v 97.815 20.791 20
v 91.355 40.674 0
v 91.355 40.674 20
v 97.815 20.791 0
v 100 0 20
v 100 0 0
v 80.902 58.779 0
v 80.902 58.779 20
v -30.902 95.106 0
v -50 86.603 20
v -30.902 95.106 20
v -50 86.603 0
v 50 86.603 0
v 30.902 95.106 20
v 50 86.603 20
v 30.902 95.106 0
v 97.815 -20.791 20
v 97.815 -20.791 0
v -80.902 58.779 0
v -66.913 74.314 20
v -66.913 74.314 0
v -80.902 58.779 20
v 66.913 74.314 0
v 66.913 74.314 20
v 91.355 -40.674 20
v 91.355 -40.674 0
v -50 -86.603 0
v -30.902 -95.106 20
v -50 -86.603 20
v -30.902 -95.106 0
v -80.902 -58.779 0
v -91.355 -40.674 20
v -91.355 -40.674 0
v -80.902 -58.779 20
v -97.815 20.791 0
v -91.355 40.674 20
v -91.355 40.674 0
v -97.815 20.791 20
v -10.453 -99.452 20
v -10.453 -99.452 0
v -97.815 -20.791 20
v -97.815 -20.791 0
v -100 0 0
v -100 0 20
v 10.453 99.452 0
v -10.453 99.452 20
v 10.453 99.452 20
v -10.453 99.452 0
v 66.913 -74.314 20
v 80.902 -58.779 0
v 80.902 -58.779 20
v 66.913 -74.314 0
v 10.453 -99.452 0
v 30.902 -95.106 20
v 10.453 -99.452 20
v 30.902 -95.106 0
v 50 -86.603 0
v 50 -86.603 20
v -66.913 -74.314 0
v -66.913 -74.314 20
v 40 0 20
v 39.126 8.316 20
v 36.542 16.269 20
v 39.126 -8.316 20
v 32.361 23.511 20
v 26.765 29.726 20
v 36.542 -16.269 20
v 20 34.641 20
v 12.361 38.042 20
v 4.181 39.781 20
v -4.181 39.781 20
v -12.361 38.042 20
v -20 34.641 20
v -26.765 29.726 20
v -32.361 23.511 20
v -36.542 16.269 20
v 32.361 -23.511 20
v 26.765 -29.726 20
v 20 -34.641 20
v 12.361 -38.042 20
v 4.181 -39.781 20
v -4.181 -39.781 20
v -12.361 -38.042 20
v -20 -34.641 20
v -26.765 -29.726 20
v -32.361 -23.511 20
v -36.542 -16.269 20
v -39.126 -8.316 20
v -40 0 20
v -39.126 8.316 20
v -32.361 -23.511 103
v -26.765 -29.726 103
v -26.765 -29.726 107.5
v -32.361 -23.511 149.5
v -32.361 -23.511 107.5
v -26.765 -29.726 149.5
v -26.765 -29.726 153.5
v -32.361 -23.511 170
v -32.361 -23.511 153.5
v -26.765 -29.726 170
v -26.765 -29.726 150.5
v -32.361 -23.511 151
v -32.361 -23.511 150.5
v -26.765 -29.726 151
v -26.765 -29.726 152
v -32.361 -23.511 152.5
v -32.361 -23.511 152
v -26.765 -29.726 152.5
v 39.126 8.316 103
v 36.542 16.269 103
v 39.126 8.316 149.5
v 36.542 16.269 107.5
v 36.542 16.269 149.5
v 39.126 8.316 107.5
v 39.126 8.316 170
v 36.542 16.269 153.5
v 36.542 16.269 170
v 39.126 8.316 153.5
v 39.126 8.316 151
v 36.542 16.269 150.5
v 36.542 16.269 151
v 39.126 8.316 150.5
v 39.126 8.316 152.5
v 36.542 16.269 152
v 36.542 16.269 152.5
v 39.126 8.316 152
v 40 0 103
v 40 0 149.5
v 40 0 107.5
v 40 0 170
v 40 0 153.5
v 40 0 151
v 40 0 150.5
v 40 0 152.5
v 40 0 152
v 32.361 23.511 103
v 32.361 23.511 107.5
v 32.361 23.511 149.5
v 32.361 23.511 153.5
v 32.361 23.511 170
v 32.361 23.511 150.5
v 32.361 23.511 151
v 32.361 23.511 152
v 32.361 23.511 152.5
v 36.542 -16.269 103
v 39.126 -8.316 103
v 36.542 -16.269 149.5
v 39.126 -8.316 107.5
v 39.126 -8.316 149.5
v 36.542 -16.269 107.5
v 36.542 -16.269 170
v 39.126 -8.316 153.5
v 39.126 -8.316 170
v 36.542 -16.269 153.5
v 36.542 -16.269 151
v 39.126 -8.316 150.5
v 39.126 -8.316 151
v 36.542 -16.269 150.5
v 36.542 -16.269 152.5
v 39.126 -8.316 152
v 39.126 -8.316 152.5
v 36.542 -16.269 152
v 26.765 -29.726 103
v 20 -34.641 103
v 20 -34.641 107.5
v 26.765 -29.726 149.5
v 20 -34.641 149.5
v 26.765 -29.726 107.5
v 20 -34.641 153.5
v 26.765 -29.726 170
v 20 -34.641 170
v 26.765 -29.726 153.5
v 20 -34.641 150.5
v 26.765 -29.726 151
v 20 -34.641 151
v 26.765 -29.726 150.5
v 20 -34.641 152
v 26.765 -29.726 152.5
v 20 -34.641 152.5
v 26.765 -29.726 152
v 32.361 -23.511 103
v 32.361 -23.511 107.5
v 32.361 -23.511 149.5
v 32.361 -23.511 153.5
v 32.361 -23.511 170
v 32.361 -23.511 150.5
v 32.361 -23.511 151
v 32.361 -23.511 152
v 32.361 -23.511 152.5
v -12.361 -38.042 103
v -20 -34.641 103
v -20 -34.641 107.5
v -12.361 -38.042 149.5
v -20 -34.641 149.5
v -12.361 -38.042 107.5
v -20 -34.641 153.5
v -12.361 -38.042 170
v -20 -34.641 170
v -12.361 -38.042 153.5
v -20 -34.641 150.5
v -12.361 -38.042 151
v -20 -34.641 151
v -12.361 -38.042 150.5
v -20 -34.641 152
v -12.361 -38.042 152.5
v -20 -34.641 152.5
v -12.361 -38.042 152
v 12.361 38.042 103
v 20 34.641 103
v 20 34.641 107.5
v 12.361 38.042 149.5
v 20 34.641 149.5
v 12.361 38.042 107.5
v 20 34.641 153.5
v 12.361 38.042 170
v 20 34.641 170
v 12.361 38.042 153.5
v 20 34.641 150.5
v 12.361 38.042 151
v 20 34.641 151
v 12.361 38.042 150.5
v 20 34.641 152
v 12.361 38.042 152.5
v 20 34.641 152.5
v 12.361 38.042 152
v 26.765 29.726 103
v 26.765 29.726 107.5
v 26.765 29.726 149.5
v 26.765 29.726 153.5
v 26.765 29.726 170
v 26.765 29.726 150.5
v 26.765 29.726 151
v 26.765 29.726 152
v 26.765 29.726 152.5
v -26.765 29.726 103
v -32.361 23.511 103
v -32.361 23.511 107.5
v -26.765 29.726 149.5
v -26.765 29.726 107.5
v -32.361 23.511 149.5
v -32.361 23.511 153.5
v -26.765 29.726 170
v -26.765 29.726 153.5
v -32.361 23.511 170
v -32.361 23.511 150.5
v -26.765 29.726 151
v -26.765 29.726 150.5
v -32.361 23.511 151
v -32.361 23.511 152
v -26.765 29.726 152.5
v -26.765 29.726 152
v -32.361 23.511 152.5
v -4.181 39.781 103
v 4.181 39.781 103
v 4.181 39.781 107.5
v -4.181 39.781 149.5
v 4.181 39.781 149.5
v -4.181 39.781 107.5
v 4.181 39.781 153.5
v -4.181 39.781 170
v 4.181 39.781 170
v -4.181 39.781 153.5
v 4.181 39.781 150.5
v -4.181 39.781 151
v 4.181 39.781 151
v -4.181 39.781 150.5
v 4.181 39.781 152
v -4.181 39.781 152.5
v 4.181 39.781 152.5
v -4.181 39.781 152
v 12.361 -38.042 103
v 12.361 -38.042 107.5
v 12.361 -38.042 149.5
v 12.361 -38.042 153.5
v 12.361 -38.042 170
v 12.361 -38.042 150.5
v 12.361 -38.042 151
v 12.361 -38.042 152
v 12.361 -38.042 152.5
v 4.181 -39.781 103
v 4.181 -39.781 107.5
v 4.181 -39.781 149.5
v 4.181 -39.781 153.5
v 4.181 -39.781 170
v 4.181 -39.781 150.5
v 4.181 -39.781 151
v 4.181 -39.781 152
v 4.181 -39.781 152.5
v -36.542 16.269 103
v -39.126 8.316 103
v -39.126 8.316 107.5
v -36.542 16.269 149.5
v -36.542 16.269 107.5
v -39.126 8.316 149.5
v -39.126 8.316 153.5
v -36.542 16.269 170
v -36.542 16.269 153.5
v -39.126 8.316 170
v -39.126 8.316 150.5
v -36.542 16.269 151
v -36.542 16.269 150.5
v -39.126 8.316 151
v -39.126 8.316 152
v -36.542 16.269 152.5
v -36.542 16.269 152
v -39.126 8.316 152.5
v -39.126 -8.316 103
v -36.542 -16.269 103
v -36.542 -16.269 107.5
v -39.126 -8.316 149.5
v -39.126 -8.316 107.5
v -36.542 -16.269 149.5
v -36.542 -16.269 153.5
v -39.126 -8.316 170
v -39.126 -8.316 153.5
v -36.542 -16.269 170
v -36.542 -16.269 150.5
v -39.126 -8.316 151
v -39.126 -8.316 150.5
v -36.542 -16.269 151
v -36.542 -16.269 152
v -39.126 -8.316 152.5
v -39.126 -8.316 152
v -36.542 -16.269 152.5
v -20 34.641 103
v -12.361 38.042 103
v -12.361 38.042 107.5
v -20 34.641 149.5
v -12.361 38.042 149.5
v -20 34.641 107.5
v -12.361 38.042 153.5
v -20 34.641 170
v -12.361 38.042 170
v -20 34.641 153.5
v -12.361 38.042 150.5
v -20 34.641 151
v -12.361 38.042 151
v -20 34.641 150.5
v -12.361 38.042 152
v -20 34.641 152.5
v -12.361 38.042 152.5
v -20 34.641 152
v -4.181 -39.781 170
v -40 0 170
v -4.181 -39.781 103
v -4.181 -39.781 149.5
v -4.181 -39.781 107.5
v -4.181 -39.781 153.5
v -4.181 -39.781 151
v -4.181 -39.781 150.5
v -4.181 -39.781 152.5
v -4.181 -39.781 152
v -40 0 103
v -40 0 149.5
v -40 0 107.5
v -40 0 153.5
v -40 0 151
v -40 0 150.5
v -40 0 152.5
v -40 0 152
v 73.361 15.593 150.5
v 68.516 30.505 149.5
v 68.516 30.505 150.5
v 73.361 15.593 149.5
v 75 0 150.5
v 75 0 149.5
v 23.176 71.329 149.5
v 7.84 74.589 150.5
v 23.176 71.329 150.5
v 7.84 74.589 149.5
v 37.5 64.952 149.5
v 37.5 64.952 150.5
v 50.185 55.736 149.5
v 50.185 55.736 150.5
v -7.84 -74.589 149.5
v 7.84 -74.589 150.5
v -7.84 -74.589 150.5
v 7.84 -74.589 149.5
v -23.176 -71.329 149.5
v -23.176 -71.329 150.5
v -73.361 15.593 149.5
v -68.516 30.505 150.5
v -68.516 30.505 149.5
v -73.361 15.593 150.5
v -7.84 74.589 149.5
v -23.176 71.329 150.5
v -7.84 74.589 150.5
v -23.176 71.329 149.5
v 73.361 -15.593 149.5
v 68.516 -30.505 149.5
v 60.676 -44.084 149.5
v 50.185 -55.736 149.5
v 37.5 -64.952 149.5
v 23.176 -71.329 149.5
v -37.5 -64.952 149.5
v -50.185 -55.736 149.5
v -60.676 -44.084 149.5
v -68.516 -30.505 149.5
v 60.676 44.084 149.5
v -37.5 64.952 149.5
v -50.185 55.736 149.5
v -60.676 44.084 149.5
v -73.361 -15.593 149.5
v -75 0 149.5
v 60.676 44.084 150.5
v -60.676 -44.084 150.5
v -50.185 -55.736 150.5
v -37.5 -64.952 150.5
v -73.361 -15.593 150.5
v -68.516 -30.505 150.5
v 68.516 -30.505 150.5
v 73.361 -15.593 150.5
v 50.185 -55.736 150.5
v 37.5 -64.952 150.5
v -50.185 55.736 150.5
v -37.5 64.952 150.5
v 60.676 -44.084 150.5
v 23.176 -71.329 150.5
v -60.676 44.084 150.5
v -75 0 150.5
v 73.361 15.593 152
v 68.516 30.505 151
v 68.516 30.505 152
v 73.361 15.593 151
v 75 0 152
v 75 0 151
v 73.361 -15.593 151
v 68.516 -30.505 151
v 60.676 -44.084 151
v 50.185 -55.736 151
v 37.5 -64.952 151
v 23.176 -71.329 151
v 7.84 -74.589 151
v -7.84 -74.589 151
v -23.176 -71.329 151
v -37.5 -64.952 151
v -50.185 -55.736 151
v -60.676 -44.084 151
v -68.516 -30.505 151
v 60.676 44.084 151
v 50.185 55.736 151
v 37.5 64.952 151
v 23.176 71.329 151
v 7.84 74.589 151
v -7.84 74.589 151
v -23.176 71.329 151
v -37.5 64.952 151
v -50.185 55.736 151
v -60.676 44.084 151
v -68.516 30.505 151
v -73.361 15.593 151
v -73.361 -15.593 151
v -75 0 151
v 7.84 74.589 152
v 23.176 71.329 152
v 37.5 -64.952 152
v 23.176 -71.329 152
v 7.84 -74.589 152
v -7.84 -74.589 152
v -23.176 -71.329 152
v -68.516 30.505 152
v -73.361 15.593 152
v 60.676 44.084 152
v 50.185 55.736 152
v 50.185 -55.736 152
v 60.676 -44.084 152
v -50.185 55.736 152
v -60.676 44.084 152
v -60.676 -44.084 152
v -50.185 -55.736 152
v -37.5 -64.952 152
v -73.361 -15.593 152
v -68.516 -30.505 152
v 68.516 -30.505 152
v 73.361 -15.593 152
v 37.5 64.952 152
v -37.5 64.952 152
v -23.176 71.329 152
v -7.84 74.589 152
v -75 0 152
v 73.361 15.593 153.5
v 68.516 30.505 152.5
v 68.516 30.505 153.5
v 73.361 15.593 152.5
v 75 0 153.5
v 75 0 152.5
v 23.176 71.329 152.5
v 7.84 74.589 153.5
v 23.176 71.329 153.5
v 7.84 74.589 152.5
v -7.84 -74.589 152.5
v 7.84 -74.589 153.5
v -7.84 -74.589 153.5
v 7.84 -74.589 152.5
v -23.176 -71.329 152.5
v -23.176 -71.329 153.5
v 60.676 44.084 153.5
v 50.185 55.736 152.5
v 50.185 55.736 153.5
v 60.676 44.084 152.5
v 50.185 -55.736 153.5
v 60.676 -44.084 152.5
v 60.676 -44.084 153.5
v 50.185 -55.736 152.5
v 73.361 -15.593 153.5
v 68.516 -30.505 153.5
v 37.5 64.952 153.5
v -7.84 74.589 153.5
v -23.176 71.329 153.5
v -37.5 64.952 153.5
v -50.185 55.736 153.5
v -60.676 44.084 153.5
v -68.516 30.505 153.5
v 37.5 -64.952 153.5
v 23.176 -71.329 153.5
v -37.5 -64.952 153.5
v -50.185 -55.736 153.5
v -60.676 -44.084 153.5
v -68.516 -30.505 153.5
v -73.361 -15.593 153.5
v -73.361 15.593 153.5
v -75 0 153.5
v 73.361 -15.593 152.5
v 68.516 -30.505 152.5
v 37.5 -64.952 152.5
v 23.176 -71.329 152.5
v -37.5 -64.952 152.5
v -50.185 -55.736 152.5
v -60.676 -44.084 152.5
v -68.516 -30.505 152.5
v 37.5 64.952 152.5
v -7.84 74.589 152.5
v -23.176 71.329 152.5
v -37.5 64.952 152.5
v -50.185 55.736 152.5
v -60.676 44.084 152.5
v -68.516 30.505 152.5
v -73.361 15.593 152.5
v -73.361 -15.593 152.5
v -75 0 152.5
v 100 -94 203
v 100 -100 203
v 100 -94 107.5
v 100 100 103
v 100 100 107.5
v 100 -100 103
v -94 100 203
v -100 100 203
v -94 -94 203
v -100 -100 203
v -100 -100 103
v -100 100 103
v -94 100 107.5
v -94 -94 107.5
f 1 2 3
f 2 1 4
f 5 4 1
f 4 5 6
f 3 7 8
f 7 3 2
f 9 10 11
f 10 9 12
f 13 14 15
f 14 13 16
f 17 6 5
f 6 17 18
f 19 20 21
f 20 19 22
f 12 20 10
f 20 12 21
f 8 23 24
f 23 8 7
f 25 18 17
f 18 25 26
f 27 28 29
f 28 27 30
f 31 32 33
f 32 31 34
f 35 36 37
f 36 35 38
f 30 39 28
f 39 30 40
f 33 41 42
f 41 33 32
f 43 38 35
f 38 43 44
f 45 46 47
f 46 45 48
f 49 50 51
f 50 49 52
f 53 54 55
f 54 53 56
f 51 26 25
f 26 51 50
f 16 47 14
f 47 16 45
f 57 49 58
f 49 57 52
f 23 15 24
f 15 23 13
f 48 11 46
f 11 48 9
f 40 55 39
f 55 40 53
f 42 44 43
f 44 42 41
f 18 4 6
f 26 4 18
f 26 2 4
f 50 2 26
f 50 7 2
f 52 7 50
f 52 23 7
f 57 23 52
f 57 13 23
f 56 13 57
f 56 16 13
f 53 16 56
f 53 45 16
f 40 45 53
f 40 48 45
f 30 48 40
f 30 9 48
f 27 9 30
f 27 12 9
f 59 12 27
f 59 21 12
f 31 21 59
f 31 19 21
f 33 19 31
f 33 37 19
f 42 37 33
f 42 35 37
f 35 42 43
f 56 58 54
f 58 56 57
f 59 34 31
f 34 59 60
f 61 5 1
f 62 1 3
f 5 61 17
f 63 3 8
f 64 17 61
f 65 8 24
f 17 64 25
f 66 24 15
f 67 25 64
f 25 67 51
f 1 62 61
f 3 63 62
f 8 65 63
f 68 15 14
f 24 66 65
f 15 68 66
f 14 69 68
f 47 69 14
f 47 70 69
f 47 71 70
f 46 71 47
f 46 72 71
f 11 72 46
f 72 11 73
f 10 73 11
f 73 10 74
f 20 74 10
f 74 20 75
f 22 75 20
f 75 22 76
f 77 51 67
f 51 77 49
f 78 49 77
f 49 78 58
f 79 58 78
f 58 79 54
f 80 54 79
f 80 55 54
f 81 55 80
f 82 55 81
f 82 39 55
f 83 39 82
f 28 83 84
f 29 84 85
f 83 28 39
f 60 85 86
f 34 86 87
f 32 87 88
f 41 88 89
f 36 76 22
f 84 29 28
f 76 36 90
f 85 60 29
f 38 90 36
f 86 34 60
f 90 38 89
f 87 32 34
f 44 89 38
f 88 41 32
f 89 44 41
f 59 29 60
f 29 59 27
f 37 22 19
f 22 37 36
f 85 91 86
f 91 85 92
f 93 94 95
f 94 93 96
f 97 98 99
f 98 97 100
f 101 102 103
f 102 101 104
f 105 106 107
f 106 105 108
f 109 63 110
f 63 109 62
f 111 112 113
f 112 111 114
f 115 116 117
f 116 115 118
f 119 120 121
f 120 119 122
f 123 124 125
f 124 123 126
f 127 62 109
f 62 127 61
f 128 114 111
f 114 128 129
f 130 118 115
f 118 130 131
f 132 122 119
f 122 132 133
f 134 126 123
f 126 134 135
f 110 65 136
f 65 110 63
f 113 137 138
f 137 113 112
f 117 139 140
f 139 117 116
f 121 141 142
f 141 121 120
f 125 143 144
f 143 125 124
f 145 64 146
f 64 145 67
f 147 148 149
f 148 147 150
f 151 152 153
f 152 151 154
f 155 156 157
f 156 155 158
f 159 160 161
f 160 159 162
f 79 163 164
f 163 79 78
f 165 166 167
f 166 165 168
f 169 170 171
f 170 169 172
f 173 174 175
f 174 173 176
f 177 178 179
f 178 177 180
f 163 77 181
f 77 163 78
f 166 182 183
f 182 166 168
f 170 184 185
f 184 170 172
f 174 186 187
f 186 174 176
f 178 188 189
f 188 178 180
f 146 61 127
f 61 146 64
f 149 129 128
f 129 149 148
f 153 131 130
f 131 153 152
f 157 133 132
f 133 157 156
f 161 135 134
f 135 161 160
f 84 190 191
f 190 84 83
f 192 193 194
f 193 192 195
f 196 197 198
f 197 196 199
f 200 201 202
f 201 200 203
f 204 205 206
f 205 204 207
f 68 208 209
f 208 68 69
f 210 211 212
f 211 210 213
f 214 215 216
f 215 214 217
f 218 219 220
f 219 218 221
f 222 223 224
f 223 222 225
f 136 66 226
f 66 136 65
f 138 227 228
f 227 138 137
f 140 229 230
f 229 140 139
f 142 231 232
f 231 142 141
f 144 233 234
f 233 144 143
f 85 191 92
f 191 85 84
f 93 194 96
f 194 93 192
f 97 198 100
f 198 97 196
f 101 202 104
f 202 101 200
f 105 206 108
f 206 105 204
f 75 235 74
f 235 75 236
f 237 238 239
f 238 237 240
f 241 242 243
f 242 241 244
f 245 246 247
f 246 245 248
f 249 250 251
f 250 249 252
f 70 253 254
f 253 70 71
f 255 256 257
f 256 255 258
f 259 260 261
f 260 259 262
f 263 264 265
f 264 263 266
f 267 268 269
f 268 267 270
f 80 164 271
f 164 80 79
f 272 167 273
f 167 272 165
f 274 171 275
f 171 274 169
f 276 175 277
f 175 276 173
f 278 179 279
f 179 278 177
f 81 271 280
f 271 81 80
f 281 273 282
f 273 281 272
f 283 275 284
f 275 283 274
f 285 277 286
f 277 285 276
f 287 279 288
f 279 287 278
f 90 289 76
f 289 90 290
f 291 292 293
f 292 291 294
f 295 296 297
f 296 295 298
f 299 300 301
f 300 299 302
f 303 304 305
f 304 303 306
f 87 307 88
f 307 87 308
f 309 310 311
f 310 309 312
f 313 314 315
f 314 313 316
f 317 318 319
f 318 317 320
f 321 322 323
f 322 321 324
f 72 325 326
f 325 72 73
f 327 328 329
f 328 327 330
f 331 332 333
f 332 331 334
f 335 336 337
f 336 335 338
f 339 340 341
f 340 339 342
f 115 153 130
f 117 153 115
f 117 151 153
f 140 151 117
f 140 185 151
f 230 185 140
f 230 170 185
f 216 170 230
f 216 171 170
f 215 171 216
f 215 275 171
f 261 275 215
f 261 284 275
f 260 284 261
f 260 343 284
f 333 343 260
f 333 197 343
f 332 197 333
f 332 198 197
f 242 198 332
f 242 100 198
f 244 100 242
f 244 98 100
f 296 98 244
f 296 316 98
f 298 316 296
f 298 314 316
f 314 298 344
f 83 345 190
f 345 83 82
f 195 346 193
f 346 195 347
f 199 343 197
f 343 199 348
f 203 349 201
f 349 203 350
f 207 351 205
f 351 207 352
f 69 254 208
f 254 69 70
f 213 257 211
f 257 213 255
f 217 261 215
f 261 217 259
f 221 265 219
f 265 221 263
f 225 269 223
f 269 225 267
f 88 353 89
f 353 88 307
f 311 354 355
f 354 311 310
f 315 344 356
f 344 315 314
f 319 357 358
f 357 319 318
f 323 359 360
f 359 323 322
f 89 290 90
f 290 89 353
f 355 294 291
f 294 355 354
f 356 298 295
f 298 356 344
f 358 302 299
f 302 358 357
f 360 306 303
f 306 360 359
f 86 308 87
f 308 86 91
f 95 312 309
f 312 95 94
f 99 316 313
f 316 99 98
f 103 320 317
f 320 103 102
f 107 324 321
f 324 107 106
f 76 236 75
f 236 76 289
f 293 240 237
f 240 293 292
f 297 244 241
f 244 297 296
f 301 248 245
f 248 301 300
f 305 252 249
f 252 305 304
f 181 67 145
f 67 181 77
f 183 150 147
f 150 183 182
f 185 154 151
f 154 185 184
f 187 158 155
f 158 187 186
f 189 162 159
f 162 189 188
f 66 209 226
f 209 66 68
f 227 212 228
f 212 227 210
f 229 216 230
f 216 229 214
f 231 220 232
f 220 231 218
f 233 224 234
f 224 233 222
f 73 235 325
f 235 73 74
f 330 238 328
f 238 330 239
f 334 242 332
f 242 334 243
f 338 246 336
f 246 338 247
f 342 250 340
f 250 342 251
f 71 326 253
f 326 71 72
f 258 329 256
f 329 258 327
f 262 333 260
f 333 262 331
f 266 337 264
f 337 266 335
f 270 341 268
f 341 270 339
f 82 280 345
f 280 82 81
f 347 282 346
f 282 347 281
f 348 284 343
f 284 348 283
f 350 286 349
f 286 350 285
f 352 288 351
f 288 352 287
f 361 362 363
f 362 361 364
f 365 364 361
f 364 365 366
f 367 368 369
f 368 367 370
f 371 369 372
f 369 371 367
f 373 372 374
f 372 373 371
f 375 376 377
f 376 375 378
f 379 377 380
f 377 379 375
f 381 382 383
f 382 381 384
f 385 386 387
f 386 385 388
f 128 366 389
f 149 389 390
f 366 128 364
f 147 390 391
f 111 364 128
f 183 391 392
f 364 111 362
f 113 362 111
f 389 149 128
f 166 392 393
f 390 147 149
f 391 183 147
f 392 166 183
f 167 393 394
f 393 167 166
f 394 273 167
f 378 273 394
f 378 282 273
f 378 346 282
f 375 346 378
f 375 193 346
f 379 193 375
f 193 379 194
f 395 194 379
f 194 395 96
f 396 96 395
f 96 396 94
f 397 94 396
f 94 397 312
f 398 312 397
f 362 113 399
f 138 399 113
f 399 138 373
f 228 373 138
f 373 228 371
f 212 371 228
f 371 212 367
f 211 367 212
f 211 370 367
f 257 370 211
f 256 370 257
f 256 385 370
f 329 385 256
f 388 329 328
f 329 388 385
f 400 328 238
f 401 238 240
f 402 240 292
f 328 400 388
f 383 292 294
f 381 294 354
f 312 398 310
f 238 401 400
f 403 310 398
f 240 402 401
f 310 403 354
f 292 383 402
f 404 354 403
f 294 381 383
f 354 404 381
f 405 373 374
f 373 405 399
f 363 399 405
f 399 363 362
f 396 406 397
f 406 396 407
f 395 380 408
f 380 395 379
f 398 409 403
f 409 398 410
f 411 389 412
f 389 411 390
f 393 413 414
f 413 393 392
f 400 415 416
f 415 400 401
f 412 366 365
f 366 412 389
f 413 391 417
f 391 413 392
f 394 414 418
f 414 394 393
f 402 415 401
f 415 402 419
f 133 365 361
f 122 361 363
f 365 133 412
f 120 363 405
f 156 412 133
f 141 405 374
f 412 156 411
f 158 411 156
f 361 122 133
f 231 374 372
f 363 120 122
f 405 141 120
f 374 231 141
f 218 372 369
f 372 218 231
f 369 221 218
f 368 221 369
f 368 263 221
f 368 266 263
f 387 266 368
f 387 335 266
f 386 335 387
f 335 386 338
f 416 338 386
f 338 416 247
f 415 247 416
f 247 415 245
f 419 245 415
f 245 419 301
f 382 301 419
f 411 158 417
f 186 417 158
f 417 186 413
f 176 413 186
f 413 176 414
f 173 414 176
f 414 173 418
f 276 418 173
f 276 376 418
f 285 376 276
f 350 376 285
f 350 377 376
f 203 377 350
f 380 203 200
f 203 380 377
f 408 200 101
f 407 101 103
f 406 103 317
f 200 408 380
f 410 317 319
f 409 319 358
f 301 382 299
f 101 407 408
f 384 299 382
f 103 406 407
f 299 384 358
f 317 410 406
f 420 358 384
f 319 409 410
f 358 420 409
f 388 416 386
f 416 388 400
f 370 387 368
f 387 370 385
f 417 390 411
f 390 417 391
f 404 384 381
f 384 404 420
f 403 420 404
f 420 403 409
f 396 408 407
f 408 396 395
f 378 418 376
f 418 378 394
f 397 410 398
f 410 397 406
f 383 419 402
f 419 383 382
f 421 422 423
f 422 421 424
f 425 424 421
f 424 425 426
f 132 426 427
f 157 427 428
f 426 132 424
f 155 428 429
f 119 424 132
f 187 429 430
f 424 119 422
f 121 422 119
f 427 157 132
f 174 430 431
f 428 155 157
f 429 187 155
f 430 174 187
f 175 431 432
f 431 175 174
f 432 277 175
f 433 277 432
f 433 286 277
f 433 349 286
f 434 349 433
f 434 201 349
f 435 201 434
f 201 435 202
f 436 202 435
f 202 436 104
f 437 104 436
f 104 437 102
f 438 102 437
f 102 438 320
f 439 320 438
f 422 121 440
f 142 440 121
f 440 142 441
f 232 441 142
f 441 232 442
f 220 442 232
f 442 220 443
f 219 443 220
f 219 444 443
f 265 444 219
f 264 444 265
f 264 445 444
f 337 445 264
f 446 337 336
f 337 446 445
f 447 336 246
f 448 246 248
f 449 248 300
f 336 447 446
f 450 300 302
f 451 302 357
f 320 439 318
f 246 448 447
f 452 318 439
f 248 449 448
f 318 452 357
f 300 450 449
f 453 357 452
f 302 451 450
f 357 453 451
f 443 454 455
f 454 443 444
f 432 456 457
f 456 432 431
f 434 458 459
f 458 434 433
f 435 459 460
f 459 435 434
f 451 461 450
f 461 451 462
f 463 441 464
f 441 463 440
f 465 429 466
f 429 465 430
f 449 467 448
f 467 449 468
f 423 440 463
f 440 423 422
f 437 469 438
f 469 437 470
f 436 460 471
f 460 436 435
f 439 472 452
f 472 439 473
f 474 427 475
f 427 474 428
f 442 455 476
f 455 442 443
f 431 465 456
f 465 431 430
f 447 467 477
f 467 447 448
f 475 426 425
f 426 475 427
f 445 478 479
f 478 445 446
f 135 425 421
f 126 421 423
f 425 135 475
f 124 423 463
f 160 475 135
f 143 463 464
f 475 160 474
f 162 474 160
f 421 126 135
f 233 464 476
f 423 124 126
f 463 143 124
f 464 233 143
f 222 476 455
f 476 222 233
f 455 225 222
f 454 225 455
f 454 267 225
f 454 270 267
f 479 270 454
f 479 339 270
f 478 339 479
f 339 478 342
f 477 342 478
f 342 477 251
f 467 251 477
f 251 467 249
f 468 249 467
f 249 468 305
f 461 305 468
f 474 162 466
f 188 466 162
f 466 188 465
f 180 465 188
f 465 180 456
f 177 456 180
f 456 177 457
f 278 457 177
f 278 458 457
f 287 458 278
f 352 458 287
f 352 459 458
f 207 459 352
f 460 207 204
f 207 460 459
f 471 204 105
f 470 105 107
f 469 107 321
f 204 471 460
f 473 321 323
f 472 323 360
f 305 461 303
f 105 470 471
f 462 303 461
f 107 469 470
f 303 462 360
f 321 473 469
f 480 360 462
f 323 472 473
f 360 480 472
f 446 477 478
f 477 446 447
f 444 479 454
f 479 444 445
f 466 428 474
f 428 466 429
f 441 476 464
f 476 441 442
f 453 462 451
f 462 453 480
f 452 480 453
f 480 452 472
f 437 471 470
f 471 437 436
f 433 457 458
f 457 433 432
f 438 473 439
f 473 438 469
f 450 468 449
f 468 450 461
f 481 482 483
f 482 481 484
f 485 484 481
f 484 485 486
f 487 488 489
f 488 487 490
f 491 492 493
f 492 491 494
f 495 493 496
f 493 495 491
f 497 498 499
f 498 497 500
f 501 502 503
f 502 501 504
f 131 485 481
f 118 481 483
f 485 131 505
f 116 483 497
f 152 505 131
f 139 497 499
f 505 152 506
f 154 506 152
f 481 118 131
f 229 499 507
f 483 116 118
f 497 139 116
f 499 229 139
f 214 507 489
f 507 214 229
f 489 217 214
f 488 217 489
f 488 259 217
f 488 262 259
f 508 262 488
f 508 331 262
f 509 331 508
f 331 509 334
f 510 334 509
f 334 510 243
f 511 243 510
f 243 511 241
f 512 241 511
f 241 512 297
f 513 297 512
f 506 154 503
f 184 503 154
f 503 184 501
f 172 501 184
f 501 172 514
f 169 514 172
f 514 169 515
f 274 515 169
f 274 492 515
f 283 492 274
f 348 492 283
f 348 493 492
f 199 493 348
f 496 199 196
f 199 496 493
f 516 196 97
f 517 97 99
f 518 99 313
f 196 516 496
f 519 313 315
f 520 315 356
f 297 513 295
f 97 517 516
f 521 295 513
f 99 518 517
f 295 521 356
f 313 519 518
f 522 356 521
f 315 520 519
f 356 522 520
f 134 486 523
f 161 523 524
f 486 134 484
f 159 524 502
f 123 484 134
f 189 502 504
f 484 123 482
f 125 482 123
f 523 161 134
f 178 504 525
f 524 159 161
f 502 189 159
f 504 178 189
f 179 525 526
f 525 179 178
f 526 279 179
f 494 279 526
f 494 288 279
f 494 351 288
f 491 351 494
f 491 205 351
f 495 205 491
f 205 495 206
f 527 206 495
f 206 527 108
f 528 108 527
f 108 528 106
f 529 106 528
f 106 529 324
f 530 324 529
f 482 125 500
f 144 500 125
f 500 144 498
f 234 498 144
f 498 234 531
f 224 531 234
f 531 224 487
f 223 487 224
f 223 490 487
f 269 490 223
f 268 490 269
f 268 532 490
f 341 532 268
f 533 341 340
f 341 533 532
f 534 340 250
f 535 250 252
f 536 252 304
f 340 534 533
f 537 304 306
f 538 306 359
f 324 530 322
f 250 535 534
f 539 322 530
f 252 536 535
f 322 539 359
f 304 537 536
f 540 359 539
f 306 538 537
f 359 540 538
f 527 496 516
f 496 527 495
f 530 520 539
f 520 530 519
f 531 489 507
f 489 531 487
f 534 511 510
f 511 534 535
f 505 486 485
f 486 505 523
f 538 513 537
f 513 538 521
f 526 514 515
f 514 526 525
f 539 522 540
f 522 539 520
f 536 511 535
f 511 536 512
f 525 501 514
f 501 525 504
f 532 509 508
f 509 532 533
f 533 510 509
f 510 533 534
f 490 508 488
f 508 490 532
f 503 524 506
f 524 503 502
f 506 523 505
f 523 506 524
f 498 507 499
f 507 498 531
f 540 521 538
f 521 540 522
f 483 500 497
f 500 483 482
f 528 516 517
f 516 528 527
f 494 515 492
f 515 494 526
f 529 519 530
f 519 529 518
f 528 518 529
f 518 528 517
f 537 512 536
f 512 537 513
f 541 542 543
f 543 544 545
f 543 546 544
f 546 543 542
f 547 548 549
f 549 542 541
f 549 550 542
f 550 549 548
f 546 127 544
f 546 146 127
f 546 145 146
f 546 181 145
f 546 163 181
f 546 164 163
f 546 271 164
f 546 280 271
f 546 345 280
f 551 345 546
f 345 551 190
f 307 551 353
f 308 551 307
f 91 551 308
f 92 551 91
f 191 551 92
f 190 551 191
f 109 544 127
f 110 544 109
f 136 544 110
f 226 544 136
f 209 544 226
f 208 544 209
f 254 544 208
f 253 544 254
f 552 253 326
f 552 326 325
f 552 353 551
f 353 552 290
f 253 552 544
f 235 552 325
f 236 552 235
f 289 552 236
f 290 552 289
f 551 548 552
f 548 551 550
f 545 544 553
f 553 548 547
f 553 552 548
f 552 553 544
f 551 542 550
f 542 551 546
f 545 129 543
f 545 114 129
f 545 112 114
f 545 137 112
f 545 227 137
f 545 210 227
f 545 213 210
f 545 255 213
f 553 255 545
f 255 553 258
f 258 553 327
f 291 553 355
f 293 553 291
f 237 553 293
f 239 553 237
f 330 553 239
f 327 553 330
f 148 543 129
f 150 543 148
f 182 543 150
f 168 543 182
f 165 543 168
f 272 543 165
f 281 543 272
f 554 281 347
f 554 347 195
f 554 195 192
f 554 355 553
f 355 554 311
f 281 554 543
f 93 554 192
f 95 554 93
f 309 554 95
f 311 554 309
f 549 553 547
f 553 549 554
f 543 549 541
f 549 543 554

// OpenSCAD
// Parameters for Kelly Kettle simulacrum
kettle_base_diameter = 200;     // Diameter of the Kelly Kettle base (mm)
kettle_flue_diameter = 80;      // Diameter of the flue (mm)
kettle_flue_height = 150;       // Height of the flue (mm)

// Parameters for AirBox
air_box_width = 200;            // Width of the Air Box (mm)
air_box_height = 100;           // Height of the Air Box (mm)
wall_thickness = 3;             // Thickness of Air Box walls (mm)

// Parameters for Airflow Regulator
base_diameter = 150;            // Diameter of the regulator plates (mm)
plate_thickness = 1;            // Thickness of each regulator plate (mm)
air_channel_width = 20;         // Width of airflow channels (mm)
num_air_channels = 6;           // Number of airflow channels
rotation_limit = 45;            // Maximum rotation of regulator plates (degrees)

// Main function: Integration of all components
module integrated_model() {
    // Visualize the Kelly Kettle
    kelly_kettle();

    // Add the airflow regulator
    translate([0, 0, kettle_flue_height])
    air_regulator_system();

    // Add the Air Box
    translate([0, 0, kettle_flue_height + 2 * (plate_thickness + 0.5)])
    air_box_attachment();
}

// Simulacrum of the Kelly Kettle
module kelly_kettle() {
    // Base
    cylinder(r=kettle_base_diameter / 2, h=20, center=false);

    // Flue
    translate([0, 0, 20])
    cylinder(r=kettle_flue_diameter / 2, h=kettle_flue_height, center=false);
}

// Airflow regulator system (reused from previous design)
module air_regulator_system() {
    translate([0, 0, 0])
    base_plate();
    
    translate([0, 0, plate_thickness + 0.5])
    middle_plate();
    
    translate([0, 0, 2 * (plate_thickness + 0.5)])
    top_plate();
}

// Base Plate
module base_plate() {
    difference() {
        cylinder(r=base_diameter / 2, h=plate_thickness, center=true);
        for (i = [0 : 360 / num_air_channels : 360 - 360 / num_air_channels]) {
            rotate([0, 0, i])
            translate([base_diameter / 4, 0, 0])
            square_air_channel();
        }
    }
}

// Middle Plate
module middle_plate() {
    difference() {
        cylinder(r=base_diameter / 2, h=plate_thickness, center=true);
        for (i = [0 : 360 / num_air_channels : 360 - 360 / num_air_channels]) {
            rotate([0, 0, i])
            translate([base_diameter / 4, 0, 0])
            square_air_channel(size_factor=0.8);
        }
    }
}

// Top Plate
module top_plate() {
    difference() {
        cylinder(r=base_diameter / 2, h=plate_thickness, center=true);
        for (i = [0 : 360 / num_air_channels : 360 - 360 / num_air_channels]) {
            rotate([0, 0, i + rotation_limit / 2])
            translate([base_diameter / 4, 0, 0])
            square_air_channel(size_factor=0.6);
        }
    }
}

// Square air channel for regulator plates
module square_air_channel(size_factor=1) {
    square([air_channel_width * size_factor, air_channel_width * size_factor], center=true);
}

// AirBox (reused from previous design)
module air_box_attachment() {
    difference() {
        translate([0, 0, 0])
        cube([air_box_width, air_box_width, air_box_height], true);

        translate([wall_thickness, wall_thickness, wall_thickness])
        cube([air_box_width - 2 * wall_thickness, air_box_width - 2 * wall_thickness, air_box_height - wall_thickness], true);

        translate([0, 0, -air_box_height / 2])
        cylinder(r=kettle_flue_diameter / 2, h=air_box_height + wall_thickness, center=true);
    }
}

// Render the integrated model
integrated_model();
